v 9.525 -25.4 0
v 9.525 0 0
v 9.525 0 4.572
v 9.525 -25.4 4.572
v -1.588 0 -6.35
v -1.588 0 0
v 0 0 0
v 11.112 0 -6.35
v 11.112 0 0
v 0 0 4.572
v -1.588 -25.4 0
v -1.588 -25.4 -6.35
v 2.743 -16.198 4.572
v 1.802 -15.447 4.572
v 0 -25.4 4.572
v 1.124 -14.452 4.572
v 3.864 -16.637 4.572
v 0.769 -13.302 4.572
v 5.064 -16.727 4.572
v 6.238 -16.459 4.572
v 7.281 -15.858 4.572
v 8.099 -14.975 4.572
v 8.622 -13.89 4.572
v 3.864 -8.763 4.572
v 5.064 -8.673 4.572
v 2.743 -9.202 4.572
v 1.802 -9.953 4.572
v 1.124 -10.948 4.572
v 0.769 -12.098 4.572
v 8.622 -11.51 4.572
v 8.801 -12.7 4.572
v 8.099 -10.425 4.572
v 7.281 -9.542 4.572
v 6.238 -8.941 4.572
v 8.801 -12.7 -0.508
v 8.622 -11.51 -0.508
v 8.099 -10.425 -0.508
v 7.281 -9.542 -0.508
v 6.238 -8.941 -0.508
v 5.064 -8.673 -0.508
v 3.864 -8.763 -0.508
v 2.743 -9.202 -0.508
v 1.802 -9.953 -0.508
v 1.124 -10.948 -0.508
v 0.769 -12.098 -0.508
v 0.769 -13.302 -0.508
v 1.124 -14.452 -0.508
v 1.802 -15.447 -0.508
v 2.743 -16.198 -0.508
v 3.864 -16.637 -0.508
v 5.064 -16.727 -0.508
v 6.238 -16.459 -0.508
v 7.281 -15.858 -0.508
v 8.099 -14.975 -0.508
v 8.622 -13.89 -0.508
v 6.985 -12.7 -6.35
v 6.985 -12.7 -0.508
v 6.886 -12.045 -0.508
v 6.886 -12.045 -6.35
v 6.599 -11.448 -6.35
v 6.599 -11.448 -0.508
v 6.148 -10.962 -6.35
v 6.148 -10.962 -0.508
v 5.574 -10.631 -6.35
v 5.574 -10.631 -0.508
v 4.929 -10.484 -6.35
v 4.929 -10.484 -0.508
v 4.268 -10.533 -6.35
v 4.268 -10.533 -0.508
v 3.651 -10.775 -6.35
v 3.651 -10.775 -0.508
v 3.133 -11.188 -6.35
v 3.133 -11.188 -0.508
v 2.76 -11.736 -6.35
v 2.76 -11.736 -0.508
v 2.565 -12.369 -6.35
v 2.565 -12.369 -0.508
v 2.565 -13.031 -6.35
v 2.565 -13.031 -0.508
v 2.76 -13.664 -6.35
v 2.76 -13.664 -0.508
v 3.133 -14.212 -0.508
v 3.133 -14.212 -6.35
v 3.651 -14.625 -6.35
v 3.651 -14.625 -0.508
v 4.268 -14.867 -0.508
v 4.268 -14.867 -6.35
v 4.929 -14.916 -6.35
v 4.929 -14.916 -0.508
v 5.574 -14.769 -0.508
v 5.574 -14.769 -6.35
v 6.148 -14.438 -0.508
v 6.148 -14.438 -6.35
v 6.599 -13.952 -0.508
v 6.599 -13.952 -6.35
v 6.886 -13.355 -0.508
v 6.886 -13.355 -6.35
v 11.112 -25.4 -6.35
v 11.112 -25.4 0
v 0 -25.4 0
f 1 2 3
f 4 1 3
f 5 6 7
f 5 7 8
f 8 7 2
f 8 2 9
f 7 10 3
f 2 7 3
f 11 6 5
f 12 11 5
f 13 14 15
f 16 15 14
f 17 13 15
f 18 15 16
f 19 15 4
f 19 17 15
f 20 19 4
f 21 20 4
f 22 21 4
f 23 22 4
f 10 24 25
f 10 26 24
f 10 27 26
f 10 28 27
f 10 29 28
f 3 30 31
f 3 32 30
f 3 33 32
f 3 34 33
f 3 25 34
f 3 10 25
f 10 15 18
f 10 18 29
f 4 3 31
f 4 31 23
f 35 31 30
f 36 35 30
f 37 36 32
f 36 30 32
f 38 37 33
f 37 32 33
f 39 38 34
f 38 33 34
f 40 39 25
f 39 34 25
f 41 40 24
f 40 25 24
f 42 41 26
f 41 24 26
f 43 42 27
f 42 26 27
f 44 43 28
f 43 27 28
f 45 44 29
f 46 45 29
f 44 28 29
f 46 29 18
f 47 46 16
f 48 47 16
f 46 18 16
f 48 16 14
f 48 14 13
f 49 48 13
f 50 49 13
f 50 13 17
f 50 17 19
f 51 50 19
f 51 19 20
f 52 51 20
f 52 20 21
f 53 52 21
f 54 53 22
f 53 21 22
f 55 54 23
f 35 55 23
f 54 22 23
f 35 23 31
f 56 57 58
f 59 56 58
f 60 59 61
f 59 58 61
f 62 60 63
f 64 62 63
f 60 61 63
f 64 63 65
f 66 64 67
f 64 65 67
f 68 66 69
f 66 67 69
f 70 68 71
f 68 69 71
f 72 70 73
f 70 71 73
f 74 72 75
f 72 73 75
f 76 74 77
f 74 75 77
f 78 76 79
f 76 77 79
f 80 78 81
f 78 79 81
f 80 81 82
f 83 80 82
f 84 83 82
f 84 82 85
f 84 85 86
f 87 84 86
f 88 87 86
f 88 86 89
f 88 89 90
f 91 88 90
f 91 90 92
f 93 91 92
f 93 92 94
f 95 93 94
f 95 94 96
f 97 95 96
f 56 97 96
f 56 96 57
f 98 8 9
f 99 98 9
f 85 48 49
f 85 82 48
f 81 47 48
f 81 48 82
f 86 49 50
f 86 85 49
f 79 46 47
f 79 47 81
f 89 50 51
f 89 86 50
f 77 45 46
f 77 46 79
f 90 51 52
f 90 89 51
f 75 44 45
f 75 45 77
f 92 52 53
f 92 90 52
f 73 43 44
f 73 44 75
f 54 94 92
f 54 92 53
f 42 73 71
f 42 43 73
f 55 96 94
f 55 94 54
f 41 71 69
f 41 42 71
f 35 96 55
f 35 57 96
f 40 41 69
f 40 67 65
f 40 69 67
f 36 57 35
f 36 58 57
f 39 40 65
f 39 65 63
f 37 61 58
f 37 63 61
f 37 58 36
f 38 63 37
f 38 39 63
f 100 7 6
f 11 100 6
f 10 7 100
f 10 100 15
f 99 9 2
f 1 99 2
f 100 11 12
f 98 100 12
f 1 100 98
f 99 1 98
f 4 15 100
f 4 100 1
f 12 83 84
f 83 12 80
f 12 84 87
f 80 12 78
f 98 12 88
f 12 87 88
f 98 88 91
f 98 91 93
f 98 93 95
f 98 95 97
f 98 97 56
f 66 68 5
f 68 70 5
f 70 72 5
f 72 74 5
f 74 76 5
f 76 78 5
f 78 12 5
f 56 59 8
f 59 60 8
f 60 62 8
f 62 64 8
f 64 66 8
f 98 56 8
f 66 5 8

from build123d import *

# Parameters (mm, degrees)
F0_W     = 9.525
F0_H     = 4.572
F1_DEPTH = 25.4
F2_R     = 4.0386
F3_DEPTH = 5.08
F4_R     = 2.2225
F5_DEPTH = 5.843


with BuildPart() as f1:
    # F0 (on Front) → F1 (new body)
    with BuildSketch(Plane.XZ):
        with Locations((4.7625, 2.286)):
            Rectangle(F0_W, F0_H)
        Polygon((9.525, 0), (0, 0), (-1.5875, 0), (-1.5875, -6.35), (11.1125, -6.35), (11.1125, 0), align=None)
    extrude(amount=F1_DEPTH)

    # F2 (on face) → F3 (cut)
    with BuildSketch(Plane.XY.offset(4.572)):
        with Locations((4.7625, -12.7)):
            Circle(F2_R)
    extrude(amount=-F3_DEPTH, mode=Mode.SUBTRACT)

    # F4 (on face) → F5 (cut, through all)
    with BuildSketch(Plane.XY.offset(-0.508)):
        with Locations((4.7625, -12.7)):
            Circle(F4_R)
    extrude(amount=-F5_DEPTH, mode=Mode.SUBTRACT)


solid = f1.part
